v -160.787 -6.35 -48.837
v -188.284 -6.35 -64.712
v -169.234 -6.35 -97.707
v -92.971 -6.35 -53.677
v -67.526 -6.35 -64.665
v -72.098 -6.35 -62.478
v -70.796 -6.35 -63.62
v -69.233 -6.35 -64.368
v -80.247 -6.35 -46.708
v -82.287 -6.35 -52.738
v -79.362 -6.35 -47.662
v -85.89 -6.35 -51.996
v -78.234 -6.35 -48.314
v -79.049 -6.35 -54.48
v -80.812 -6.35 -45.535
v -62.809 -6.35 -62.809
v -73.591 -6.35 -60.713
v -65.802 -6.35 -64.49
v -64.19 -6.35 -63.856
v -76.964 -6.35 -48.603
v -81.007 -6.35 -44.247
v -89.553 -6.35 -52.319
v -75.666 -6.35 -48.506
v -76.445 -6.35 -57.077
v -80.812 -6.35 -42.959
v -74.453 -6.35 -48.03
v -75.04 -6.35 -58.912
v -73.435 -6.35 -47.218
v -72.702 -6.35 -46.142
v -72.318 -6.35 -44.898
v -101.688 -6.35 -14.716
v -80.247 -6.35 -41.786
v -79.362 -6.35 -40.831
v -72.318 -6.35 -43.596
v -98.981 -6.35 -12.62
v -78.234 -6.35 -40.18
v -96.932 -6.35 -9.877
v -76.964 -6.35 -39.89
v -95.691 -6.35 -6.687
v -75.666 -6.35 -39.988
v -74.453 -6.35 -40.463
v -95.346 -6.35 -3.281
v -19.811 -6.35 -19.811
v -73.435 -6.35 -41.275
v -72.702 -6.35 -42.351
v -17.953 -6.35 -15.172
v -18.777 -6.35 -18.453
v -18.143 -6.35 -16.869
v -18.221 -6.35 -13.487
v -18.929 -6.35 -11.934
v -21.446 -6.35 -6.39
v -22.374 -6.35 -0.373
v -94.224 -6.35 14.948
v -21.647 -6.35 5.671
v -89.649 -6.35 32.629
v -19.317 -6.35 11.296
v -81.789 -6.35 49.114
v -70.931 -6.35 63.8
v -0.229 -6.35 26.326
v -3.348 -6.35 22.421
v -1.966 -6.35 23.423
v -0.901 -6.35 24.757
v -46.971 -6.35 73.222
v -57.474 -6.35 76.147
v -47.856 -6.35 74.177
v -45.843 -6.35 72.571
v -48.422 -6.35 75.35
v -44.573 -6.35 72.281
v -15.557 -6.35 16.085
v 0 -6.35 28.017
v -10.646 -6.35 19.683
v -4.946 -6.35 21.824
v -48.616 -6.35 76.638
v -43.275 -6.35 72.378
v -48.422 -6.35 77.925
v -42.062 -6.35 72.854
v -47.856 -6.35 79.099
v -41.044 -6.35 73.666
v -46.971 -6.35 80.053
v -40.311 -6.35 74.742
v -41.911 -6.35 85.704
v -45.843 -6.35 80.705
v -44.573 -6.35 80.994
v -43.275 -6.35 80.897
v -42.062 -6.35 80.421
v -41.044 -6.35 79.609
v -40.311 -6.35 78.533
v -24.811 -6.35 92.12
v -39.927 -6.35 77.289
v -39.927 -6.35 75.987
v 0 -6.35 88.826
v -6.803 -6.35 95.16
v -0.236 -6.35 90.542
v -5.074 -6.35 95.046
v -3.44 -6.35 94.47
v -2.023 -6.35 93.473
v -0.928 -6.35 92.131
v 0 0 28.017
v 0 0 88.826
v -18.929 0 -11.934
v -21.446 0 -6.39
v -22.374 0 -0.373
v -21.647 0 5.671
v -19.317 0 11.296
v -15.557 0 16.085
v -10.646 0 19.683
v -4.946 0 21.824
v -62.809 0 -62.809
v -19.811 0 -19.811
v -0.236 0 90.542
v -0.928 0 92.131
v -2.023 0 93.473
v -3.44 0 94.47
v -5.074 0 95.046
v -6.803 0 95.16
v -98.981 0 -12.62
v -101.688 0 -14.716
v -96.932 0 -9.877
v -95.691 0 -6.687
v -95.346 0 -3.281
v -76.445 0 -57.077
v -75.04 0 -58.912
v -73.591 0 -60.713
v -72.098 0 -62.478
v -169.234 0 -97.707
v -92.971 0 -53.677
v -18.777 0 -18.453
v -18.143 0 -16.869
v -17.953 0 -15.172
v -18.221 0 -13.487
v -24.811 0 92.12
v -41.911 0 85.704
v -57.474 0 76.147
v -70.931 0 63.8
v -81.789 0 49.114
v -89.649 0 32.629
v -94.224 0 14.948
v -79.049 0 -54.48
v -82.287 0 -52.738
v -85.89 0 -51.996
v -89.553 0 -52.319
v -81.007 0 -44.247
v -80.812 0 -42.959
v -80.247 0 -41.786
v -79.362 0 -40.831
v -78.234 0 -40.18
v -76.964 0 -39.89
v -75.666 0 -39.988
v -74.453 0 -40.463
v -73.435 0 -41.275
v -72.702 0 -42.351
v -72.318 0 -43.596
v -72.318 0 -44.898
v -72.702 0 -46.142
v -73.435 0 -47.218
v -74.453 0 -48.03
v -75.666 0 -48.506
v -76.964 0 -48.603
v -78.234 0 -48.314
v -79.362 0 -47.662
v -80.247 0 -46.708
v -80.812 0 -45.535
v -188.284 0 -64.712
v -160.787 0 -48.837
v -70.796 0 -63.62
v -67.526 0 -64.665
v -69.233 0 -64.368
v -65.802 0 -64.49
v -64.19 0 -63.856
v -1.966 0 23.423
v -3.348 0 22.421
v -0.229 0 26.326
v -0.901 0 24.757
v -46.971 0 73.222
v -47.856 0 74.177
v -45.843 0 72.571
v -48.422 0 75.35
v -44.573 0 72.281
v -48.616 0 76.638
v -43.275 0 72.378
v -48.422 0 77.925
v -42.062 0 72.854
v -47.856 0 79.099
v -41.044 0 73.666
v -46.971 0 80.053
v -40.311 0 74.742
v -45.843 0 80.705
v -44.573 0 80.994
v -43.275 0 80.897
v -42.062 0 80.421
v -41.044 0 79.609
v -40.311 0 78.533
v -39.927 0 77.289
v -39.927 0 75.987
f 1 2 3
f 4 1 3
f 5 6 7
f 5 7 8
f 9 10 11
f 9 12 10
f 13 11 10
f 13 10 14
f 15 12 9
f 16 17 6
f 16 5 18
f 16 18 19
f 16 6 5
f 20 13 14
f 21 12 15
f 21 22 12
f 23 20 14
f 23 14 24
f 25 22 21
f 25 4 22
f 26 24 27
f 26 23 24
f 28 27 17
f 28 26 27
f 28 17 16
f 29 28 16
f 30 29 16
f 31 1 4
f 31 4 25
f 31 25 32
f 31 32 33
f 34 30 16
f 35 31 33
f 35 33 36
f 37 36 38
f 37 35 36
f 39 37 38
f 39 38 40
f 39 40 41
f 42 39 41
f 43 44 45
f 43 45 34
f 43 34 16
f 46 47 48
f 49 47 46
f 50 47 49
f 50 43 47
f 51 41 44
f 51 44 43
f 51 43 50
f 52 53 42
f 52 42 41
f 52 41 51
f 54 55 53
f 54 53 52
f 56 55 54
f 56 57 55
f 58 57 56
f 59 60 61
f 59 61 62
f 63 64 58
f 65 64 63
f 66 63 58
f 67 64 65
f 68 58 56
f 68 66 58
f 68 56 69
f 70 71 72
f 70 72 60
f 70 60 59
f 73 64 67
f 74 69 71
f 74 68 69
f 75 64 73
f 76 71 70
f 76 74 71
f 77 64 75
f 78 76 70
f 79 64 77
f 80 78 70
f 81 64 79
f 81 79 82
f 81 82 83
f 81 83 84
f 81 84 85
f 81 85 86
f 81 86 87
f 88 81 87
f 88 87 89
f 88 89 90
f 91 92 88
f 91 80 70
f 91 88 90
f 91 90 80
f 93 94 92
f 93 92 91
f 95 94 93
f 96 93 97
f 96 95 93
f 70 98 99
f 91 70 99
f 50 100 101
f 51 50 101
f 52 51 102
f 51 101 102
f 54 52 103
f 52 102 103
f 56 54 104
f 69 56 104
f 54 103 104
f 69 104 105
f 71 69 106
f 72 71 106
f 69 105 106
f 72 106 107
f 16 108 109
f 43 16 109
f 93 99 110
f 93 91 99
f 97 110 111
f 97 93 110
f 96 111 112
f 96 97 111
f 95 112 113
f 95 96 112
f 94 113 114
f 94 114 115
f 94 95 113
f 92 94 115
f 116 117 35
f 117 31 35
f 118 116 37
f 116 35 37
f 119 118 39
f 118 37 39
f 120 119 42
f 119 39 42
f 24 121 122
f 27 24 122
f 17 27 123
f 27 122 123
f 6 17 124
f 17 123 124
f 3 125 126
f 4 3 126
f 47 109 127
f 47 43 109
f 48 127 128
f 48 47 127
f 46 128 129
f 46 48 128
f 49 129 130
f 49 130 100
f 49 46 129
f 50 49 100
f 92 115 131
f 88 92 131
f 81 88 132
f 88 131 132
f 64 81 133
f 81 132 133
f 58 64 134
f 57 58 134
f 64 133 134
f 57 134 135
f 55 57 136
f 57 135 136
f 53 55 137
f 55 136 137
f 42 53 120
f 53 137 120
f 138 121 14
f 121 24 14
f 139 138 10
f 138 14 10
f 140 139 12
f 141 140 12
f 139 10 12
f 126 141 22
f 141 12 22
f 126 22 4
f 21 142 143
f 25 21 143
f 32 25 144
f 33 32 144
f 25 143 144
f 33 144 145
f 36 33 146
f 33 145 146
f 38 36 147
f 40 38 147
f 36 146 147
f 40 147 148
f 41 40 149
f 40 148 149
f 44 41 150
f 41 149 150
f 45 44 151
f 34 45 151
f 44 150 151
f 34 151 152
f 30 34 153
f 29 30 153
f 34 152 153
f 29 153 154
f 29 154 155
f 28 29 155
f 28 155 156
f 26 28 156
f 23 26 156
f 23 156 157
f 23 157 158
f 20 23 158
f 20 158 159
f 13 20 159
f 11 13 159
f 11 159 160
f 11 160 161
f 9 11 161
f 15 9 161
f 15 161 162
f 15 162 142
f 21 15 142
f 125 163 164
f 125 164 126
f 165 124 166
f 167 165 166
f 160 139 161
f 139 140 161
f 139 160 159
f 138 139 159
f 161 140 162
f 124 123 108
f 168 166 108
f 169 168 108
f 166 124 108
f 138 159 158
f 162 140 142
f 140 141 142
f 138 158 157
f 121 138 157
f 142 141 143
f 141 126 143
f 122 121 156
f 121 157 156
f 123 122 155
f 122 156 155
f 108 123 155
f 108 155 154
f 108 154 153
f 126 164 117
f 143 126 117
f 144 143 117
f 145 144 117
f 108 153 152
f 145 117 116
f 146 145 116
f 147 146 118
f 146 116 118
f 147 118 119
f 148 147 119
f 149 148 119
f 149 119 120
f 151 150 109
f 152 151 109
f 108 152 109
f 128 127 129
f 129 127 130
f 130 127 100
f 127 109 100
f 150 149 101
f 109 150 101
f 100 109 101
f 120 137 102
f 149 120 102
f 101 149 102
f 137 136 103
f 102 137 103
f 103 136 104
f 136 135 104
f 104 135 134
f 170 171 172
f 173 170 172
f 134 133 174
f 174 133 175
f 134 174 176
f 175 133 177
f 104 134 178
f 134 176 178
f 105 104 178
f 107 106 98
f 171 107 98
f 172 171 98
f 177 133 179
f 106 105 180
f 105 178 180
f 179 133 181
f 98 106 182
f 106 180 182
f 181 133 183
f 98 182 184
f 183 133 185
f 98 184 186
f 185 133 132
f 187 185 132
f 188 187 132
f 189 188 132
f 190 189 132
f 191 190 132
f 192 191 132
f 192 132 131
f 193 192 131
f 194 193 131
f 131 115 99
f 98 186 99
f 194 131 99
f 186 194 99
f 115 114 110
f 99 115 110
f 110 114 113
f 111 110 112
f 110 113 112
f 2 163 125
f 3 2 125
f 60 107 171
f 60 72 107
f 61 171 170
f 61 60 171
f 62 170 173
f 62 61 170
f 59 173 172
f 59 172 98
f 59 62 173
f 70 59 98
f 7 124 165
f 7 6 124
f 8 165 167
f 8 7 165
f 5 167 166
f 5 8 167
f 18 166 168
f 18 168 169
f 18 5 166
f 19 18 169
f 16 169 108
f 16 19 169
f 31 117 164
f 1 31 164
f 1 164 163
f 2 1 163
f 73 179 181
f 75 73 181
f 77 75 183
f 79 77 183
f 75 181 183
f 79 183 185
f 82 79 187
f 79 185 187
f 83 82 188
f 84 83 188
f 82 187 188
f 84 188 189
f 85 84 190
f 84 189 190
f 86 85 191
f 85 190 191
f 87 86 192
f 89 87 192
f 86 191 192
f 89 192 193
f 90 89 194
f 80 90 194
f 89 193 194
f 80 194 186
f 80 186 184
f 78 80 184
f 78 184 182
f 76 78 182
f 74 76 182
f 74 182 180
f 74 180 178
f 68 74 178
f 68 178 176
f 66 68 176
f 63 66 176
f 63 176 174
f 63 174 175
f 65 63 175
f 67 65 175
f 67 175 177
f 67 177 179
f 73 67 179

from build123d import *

# Parameters (mm, degrees)
F1_DEPTH = 6.35
F3_D     = 8.7376
F4_R     = 12.7
F5_R     = 6.35


with BuildPart() as f1:
    # F0 (on Front) → F1 (new body)
    with BuildSketch(Plane.XZ):
        with BuildLine():
            Line((-141.7374620444, -81.8321618656), (-82.620901982, -47.7012))
            ThreePointArc((-82.620901982, -47.7012), (-75.6878127118, -58.0773013549), (-67.4596839815, -67.4596839815))
            Line((-67.4596839815, -67.4596839815), (-15.8232112853, -15.8232112853))
            ThreePointArc((-15.8232112853, -15.8232112853), (-20.6740218508, 8.5634602394), (0, 22.3774))
            Line((0, 22.3774), (0, 95.4024))
            ThreePointArc((0, 95.4024), (-71.1544614181, 63.5504566943), (-94.7963262761, -10.7365939814))
            Line((-94.7963262761, -10.7365939814), (-160.7874620444, -48.8365939814))
            Line((-160.7874620444, -48.8365939814), (-188.2837686146, -64.7115939814))
            Line((-188.2837686146, -64.7115939814), (-169.2337686146, -97.7071618656))
            Line((-169.2337686146, -97.7071618656), (-141.7374620444, -81.8321618656))
        make_face()
    extrude(amount=F1_DEPTH)

    # F3 (through all)
    with Locations(Plane.XZ.offset(6.35)):
        with Locations((-44.2468, 76.6377056723), (-76.6377056723, -44.2468)):
            Hole(F3_D / 2)

    # F4
    f4_edges = [f1.edges().sort_by_distance(p)[0] for p in [
        (-82.620902, -3.175, -47.7012),
        (-94.796326, -3.175, -10.736594),
    ]]
    fillet(f4_edges, radius=F4_R)

    # F5
    f5_edges = [f1.edges().sort_by_distance(p)[0] for p in [
        (-67.459684, -3.175, -67.459684),
        (-15.823211, -3.175, -15.823211),
        (0, -3.175, 22.3774),
        (0, -3.175, 95.4024),
    ]]
    fillet(f5_edges, radius=F5_R)


solid = f1.part
